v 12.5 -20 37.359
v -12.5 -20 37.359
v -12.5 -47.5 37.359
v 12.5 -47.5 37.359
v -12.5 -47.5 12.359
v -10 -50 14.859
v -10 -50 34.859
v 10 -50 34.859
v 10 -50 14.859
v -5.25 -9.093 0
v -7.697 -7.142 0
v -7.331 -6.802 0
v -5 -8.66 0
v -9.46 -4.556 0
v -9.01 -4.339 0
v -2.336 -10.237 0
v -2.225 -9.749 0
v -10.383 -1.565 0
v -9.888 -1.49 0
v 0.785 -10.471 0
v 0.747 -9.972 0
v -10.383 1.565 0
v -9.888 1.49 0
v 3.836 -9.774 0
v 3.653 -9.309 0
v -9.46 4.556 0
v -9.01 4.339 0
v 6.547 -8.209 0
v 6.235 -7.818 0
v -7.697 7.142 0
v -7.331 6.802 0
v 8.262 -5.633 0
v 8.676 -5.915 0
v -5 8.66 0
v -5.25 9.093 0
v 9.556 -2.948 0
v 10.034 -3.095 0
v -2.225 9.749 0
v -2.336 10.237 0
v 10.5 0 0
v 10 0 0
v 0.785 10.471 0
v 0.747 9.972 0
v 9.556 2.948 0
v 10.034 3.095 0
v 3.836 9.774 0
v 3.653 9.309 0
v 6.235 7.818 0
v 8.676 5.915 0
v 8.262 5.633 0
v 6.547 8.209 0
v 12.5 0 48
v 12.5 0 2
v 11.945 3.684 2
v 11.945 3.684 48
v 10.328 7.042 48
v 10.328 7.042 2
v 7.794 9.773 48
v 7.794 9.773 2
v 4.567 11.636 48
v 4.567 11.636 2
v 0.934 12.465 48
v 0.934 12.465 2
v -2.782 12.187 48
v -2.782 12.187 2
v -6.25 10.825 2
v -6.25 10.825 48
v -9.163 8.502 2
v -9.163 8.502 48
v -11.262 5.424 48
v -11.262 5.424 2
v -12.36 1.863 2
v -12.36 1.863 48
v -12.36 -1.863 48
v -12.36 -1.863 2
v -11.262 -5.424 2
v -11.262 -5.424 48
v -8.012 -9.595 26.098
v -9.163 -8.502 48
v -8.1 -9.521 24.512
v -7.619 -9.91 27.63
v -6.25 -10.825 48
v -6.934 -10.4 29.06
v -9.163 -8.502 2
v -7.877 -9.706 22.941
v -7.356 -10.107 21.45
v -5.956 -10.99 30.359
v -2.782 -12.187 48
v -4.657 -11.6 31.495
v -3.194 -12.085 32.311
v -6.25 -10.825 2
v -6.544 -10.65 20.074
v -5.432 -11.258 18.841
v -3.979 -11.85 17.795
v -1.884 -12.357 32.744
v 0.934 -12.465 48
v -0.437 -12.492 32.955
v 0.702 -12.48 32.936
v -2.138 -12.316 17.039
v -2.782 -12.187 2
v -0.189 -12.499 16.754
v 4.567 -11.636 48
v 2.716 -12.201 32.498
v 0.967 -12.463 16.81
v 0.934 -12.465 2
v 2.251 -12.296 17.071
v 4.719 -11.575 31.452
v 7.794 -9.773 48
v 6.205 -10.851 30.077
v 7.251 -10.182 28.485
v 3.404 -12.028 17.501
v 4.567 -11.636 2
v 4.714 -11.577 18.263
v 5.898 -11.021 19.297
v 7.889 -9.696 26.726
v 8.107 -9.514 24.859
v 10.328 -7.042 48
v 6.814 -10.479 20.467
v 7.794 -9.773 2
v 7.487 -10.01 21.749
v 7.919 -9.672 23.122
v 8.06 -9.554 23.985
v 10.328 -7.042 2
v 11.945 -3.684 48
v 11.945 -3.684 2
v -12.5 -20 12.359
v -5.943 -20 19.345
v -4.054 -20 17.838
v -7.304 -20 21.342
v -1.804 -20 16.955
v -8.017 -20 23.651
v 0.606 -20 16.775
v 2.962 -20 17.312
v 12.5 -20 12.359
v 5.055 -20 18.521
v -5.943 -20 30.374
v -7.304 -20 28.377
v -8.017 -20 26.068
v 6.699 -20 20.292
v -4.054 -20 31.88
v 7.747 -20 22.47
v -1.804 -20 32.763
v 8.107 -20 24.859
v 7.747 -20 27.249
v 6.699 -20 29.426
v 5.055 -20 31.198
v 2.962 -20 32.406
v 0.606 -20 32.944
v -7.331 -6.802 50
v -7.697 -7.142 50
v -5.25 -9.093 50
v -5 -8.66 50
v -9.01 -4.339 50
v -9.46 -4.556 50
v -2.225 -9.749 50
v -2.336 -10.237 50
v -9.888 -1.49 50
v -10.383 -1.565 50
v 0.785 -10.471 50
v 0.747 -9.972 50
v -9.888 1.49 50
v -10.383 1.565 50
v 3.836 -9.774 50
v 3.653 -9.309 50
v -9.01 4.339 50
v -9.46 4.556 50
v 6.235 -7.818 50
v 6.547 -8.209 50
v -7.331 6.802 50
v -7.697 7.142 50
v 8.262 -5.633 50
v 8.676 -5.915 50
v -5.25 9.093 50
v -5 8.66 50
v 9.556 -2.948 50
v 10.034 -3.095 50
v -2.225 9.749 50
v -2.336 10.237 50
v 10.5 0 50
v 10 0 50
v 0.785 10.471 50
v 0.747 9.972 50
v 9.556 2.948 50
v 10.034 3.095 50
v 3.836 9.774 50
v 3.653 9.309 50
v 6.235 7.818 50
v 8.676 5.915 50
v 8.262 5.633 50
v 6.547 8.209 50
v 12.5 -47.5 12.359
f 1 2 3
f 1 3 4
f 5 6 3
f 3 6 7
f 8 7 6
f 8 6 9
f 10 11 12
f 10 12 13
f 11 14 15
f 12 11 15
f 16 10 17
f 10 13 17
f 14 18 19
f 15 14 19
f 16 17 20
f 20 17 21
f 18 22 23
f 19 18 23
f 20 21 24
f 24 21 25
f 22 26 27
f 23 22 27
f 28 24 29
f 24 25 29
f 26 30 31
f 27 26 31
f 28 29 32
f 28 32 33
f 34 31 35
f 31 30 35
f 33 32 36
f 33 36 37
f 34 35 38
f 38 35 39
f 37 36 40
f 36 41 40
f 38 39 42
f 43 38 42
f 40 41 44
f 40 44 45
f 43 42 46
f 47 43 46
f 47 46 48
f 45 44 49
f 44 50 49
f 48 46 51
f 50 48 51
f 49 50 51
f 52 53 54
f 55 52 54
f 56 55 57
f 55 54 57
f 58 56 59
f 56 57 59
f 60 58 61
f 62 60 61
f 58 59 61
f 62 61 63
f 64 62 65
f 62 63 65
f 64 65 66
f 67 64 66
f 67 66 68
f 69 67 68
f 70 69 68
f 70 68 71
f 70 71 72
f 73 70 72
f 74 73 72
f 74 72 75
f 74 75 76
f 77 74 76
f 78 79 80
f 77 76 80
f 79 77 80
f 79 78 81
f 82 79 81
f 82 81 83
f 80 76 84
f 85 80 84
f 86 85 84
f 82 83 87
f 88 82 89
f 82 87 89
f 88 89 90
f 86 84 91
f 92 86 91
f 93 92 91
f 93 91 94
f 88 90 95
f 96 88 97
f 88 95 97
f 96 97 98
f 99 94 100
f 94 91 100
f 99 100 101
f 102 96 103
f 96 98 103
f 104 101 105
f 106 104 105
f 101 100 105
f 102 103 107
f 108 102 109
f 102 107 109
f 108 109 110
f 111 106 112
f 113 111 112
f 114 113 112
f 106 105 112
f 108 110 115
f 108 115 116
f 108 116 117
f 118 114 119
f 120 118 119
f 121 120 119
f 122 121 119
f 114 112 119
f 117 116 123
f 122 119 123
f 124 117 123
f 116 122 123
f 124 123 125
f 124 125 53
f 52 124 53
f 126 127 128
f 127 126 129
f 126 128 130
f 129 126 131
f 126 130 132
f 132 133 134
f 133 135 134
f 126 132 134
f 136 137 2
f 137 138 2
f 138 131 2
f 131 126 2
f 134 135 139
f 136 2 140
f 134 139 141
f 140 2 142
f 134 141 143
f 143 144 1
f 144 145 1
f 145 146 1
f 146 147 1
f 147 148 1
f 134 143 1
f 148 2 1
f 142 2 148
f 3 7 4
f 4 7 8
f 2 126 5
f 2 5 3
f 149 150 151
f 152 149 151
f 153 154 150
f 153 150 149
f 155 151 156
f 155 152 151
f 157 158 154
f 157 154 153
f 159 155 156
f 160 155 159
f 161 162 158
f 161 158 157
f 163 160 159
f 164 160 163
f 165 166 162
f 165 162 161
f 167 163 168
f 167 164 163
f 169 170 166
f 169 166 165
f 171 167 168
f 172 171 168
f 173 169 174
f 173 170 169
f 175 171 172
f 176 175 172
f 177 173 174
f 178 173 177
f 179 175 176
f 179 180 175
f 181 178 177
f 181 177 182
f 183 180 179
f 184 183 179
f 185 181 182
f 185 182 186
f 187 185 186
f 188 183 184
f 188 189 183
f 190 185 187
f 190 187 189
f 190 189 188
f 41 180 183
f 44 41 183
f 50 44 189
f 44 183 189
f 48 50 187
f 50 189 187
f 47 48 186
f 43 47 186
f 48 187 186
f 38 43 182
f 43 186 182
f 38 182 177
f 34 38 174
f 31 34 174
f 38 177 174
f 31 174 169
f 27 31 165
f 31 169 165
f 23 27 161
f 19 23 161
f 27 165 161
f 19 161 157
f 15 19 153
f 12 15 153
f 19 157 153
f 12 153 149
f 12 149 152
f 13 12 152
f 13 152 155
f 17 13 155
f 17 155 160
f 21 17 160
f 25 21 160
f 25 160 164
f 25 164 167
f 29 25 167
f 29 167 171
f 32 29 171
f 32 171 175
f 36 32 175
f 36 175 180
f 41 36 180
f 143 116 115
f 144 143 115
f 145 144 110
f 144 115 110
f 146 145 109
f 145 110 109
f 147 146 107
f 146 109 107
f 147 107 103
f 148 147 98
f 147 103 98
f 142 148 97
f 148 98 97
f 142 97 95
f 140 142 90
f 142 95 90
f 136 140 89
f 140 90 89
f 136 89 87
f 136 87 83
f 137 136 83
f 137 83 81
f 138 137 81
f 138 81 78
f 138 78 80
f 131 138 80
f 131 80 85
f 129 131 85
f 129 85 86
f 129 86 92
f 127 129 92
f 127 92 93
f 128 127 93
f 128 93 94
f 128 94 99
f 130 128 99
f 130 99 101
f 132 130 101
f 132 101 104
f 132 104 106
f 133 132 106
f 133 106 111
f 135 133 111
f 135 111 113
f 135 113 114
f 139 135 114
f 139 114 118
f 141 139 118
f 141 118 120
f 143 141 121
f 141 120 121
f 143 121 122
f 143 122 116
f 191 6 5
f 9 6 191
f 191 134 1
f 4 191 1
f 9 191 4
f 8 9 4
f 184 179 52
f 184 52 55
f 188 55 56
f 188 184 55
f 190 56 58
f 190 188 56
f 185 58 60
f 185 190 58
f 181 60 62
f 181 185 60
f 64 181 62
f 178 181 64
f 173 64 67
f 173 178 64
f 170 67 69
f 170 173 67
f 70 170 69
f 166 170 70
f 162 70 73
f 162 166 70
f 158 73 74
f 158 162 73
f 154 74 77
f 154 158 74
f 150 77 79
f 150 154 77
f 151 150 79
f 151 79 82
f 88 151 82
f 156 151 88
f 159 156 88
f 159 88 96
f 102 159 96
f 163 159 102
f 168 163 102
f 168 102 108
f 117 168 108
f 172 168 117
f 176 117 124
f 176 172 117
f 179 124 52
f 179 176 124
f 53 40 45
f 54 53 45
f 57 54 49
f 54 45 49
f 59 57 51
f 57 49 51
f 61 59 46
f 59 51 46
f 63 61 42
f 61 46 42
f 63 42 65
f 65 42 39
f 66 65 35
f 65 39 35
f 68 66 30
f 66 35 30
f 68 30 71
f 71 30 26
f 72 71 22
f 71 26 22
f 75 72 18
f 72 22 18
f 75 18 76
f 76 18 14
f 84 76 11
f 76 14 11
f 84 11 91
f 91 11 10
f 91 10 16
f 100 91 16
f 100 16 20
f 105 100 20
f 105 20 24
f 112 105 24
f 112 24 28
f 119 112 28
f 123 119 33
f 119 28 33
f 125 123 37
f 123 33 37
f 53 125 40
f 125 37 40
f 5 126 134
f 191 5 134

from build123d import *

# Parameters (mm, degrees)
F0_R     = 12.5
F1_DEPTH = 50
F2_SIZE  = 2
F3_R     = 8.107288
F4_DEPTH = 20
F5_W     = 25
F5_H     = 25
F6_DEPTH = 30
F7_SIZE  = 2.5
F8_R     = 10
F9_DEPTH = 50.001


with BuildPart() as f1:
    # F0 (on Top) → F1 (new body)
    with BuildSketch(Plane.XY):
        Circle(F0_R)
    extrude(amount=F1_DEPTH)

    # F2
    f2_edges = [f1.edges().sort_by_distance(p)[0] for p in [
        (-12.5, 0, 50),
        (-12.5, 0, 0),
    ]]
    chamfer(f2_edges, length=F2_SIZE)

    # F3 (on Front) → F4 (join)
    with BuildSketch(Plane.XZ):
        with Locations((0, 24.859188)):
            Circle(F3_R)
    extrude(amount=F4_DEPTH)

    # F5 (on face) → F6 (join)
    with BuildSketch(Plane.XZ.offset(20)):
        with Locations((0, 24.859188)):
            Rectangle(F5_W, F5_H)
    extrude(amount=F6_DEPTH)

    # F7
    f7_edges = [f1.edges().sort_by_distance(p)[0] for p in [
        (0, -50, 37.359188),
        (-12.5, -50, 24.859188),
        (0, -50, 12.359188),
        (12.5, -50, 24.859188),
    ]]
    chamfer(f7_edges, length=F7_SIZE)

    # F8 (on face) → F9 (cut, through all)
    with BuildSketch(Plane.XY.offset(50)):
        Circle(F8_R)
    extrude(amount=-F9_DEPTH, mode=Mode.SUBTRACT)


solid = f1.part
